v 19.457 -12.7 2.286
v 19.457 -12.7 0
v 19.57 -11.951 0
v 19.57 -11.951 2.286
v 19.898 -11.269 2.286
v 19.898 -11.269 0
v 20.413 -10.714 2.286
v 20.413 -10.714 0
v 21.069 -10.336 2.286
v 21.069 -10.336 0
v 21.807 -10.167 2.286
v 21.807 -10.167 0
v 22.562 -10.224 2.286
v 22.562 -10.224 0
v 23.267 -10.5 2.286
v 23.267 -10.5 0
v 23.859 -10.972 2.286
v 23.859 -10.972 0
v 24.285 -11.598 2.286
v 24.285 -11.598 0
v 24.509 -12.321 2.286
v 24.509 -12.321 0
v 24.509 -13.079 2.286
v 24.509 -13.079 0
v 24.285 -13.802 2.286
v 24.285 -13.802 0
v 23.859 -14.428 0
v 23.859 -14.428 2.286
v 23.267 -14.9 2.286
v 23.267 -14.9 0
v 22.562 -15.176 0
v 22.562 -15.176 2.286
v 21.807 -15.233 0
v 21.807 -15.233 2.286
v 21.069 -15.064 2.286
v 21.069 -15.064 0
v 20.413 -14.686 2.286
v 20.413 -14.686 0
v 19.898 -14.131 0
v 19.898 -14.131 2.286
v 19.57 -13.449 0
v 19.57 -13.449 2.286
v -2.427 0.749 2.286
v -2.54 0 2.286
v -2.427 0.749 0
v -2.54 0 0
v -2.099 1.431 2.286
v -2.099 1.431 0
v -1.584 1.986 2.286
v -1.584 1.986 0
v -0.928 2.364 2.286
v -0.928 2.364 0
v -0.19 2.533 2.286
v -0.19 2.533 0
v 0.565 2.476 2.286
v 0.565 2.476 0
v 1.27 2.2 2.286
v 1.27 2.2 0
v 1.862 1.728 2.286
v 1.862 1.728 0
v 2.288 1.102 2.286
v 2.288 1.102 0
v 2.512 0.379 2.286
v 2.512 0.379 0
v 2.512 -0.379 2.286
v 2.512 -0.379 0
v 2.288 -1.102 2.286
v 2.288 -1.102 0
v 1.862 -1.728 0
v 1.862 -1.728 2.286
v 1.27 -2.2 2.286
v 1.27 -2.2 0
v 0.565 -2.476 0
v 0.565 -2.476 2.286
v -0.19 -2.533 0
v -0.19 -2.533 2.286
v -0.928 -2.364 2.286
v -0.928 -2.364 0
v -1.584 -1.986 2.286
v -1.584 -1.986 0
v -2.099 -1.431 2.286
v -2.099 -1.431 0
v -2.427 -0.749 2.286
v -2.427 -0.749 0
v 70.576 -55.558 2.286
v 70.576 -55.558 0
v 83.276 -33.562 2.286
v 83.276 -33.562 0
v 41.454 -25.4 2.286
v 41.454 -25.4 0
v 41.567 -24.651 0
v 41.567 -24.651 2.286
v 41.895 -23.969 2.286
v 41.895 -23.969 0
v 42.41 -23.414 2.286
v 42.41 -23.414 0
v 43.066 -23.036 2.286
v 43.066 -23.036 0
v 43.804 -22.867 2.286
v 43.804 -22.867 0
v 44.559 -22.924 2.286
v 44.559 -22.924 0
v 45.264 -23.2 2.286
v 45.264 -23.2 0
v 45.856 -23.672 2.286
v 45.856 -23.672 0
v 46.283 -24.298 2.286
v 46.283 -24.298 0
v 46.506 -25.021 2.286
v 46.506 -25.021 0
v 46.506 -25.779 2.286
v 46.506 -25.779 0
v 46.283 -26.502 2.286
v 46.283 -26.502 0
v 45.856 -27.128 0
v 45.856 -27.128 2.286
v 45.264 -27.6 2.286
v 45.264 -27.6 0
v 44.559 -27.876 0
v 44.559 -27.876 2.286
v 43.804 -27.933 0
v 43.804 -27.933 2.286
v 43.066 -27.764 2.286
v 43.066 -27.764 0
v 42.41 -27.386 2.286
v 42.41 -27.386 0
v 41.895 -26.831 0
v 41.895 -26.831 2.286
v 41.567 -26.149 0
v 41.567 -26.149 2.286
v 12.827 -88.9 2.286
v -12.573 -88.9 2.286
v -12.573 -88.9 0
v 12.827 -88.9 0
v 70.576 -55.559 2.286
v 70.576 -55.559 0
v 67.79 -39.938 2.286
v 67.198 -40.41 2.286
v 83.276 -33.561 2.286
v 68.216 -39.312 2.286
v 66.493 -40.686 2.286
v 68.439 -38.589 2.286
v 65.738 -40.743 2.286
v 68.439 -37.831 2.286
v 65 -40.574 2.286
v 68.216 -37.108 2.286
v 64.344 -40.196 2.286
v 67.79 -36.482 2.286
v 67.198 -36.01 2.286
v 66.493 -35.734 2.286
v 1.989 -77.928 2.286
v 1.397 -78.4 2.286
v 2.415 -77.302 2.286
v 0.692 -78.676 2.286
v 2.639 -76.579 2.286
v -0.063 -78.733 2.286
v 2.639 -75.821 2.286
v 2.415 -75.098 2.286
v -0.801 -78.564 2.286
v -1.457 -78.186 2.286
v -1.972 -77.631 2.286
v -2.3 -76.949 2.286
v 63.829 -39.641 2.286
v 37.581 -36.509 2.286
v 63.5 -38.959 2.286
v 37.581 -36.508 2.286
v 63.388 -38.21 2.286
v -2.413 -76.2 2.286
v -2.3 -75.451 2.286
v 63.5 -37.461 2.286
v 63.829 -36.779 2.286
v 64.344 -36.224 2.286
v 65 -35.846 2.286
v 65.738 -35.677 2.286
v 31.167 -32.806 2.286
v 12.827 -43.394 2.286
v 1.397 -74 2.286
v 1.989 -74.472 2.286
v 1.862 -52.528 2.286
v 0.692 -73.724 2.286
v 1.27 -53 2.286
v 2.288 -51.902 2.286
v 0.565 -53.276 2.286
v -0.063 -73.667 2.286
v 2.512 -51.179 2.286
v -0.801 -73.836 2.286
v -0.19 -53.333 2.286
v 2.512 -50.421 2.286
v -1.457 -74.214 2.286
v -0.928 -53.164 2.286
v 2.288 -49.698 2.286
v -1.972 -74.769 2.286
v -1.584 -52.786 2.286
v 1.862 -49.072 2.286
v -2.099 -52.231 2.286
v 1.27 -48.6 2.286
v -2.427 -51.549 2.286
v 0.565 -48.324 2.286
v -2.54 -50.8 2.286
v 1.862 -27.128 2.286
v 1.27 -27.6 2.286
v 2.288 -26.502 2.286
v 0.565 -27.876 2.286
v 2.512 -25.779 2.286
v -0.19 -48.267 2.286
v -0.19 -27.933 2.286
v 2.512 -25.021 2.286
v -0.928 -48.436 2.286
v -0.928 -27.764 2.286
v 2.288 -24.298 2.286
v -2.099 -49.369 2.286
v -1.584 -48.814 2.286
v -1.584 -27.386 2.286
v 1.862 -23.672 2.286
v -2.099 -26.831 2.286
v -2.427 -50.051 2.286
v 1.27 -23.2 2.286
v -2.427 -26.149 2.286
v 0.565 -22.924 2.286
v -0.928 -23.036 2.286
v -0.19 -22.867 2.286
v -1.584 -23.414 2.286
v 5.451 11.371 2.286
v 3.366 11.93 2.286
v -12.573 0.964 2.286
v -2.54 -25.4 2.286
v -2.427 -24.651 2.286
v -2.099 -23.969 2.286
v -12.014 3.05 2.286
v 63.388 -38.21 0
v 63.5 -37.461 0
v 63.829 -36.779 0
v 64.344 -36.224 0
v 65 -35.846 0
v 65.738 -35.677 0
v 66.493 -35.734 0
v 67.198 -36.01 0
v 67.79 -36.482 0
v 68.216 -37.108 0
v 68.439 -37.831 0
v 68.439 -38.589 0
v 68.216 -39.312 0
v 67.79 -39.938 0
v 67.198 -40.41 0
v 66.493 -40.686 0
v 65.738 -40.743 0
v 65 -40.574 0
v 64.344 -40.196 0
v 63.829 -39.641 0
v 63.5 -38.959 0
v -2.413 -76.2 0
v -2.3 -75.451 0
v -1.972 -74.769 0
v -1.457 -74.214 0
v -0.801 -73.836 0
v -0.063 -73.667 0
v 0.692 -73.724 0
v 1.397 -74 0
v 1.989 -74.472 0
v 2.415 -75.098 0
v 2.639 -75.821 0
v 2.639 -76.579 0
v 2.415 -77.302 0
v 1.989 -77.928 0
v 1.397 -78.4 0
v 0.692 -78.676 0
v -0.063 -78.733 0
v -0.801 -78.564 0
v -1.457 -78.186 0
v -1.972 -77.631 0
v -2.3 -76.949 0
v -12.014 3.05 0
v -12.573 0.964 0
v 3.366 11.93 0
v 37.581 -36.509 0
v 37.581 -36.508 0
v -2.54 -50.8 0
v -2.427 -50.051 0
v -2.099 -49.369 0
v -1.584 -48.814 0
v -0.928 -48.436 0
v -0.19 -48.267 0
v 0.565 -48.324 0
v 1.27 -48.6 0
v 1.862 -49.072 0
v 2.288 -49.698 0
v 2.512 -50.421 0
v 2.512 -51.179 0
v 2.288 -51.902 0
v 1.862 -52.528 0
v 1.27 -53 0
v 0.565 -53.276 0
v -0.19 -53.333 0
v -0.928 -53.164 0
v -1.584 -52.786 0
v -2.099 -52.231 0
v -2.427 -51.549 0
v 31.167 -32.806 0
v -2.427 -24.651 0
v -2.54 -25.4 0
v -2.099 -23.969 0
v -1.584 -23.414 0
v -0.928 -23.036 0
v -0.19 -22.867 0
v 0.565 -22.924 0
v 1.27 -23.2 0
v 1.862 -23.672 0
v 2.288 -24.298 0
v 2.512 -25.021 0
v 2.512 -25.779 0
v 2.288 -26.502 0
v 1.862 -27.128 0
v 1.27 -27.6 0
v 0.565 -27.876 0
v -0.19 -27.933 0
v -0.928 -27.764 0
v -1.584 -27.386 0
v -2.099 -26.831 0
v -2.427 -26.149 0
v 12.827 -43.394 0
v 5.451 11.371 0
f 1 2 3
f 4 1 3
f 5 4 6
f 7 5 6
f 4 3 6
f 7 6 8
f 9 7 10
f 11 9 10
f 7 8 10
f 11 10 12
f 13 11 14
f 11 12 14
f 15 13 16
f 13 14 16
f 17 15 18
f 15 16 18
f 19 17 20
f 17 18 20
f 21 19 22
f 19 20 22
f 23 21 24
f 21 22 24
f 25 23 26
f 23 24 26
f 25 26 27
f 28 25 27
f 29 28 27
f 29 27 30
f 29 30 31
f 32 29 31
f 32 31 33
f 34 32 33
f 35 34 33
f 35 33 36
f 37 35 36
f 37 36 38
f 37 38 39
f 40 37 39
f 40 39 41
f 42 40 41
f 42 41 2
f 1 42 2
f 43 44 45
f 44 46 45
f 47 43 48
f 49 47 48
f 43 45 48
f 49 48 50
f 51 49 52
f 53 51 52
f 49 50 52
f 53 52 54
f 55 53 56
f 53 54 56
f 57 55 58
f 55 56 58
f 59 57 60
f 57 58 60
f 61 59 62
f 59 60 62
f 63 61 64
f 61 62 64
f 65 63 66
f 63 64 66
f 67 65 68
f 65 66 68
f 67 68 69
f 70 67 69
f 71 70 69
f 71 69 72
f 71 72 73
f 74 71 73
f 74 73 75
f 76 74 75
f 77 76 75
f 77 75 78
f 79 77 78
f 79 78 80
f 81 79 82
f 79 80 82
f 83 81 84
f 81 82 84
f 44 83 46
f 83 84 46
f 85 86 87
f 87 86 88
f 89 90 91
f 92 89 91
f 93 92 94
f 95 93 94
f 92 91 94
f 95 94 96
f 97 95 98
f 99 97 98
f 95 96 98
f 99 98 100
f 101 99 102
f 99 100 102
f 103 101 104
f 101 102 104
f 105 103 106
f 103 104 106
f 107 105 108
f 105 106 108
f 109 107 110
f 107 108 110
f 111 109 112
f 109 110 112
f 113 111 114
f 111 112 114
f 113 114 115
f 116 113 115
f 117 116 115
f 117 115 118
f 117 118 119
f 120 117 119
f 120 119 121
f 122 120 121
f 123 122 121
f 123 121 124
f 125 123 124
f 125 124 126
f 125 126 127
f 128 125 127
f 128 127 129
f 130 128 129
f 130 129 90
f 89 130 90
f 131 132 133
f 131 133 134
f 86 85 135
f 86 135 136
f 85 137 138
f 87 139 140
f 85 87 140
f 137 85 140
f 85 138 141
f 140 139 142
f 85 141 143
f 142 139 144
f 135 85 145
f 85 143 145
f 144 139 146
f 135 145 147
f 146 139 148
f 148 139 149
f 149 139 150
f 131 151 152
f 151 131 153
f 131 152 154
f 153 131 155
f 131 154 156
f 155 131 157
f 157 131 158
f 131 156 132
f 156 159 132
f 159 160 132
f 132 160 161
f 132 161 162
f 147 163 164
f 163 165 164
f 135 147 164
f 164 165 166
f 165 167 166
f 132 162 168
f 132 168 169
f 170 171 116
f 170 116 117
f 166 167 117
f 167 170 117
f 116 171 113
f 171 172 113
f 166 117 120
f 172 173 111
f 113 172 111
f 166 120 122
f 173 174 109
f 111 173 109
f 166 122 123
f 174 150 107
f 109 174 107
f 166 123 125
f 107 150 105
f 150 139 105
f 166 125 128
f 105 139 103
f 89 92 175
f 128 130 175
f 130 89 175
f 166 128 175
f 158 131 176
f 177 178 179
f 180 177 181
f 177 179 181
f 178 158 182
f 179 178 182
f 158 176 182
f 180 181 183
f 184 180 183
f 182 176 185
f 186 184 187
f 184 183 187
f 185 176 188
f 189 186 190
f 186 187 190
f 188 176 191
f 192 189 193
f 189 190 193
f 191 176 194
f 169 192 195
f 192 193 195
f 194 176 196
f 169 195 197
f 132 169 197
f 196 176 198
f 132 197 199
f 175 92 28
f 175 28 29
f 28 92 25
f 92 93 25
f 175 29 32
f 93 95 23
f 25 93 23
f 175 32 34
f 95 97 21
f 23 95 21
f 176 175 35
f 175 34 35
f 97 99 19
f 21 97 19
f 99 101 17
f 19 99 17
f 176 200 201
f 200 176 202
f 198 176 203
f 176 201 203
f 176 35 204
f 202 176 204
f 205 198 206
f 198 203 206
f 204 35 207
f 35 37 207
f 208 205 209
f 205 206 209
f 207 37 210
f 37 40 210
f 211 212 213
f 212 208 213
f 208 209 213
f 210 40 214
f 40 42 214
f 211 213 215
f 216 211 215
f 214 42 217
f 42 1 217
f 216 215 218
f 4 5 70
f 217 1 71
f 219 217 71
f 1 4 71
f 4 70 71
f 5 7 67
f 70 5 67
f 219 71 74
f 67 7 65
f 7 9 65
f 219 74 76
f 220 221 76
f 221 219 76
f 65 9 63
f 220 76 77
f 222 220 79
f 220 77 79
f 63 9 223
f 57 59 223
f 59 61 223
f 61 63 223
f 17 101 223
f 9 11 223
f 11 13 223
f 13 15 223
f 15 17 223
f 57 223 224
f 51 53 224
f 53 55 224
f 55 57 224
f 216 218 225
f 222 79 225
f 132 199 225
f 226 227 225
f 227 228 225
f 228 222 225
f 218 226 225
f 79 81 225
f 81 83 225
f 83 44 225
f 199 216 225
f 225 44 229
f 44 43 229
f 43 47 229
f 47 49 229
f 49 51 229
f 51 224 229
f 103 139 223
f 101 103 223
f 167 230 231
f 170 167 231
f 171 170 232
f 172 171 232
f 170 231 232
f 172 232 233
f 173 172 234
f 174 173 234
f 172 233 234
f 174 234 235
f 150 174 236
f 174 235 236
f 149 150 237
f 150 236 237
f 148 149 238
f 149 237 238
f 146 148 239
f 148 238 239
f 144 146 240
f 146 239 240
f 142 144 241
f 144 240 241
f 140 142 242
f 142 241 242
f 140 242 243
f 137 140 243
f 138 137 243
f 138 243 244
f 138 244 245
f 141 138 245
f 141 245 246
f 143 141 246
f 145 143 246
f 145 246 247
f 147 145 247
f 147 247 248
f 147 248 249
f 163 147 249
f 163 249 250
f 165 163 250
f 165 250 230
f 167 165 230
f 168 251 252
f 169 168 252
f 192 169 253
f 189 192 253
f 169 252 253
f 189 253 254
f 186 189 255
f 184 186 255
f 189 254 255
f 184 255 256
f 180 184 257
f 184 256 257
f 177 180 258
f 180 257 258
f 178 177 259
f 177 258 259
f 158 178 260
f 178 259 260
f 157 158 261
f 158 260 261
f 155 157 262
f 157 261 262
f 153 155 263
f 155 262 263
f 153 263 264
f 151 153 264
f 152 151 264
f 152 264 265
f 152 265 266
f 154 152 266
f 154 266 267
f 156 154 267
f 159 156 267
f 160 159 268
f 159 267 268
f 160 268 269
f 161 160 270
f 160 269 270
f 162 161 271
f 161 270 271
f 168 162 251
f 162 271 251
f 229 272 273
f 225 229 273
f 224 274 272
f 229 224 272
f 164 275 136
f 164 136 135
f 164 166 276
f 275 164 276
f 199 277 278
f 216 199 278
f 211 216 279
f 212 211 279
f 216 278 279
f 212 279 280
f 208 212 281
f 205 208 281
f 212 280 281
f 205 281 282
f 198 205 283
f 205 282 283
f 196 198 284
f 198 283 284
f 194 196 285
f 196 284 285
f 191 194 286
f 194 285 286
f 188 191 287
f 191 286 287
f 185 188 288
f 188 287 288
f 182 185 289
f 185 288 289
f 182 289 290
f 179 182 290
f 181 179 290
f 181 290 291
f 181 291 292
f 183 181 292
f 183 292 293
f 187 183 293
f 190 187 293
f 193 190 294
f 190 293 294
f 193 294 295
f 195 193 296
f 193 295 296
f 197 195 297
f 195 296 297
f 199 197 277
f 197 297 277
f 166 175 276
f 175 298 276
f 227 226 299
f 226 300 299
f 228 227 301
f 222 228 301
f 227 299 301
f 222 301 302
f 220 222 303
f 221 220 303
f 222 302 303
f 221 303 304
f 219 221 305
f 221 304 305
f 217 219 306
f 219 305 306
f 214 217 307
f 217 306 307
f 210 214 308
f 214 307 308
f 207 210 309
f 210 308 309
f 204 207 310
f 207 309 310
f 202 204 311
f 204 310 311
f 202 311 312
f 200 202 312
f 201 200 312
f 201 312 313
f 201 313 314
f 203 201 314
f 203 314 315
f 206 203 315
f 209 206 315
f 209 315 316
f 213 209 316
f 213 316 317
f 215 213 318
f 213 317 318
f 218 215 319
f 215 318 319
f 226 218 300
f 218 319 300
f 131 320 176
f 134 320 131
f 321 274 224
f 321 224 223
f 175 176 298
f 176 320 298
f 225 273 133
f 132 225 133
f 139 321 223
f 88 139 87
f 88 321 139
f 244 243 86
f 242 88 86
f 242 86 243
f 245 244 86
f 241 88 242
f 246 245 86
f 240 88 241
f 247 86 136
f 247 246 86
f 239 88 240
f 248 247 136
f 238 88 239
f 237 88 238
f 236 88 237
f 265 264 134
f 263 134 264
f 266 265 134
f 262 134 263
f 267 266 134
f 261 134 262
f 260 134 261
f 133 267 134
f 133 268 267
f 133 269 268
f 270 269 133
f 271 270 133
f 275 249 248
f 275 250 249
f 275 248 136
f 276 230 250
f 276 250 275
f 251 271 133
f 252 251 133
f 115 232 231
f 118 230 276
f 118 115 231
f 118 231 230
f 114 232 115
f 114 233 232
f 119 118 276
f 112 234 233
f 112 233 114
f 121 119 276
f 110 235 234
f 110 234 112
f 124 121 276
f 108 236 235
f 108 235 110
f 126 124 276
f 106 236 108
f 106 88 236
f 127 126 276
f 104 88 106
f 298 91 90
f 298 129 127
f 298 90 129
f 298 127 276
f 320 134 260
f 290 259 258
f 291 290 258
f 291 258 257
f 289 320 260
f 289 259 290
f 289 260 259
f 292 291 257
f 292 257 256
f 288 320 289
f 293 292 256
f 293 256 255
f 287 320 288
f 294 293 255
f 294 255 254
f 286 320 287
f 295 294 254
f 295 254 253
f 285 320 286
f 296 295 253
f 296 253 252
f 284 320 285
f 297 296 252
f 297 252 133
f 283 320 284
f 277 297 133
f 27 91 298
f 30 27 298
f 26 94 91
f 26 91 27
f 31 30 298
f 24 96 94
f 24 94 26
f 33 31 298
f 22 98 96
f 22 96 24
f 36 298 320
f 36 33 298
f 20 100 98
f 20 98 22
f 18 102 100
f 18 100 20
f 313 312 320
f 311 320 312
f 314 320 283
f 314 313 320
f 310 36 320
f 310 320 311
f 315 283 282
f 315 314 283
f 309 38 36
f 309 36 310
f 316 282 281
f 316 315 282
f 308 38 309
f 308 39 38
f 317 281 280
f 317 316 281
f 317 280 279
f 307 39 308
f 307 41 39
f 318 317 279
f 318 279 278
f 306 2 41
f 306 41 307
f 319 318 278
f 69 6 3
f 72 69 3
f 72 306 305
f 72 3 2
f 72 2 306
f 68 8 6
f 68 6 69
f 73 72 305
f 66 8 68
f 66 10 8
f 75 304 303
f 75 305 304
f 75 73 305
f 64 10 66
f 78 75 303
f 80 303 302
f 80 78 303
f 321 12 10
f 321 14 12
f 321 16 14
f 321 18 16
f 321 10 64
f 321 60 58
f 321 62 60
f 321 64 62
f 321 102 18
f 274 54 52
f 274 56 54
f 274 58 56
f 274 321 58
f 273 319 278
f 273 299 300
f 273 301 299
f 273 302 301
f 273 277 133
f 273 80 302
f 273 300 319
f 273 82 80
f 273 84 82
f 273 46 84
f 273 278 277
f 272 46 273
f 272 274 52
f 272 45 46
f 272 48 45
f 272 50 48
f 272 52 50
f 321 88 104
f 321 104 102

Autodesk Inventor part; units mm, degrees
ref_plane "YZ Plane" through (0, 0, 0) normal (1, 0, 0) x (0, 1, 0)
ref_plane "XZ Plane" through (0, 0, 0) normal (0, 1, 0) x (-1, 0, 0)
ref_plane "XY Plane" through (0, 0, 0) normal (0, 0, 1) x (1, 0, 0)
sketch "Sketch3" plane through (-10.4876, -69.85, 2.286) normal (0, -1, 0) x (1, 0, 0)
  line L0 (0, 0) -> (22.7558, 0) projected
  line L1 (0, -2.286) -> (0, 0) projected
  line L2 (0, -2.286) -> (22.7558, -2.286) projected
  line L3 (22.7558, -2.286) -> (22.7558, 0) projected
  line L4 (22.7558, 0) -> (23.3146, 0) projected
  line L5 (22.7558, -2.286) -> (22.7558, 0) projected
  line L6 (22.7558, -2.286) -> (23.3146, -2.286) projected
  line L7 (23.3146, -2.286) -> (23.3146, 0) projected
  line L8 (0, 0) -> (-2.0854, 0) projected
  line L9 (-2.0854, -2.286) -> (-2.0854, 0) projected
  line L10 (0, -2.286) -> (-2.0854, -2.286) projected
  line L11 (0, -2.286) -> (0, 0) projected
  point P0 (10.4876, -2.286)
extrude "Extrusion3" add sketch "Sketch3" along normal mid plane 38.1
sketch "Sketch4" plane through (65.7357, -25.8425, 2.286) normal (0.866, -0.5, 0) x (0, 0, -1)
  line L0 (2.286, 0) -> (0, 0) projected
  line L1 (0, -22.7558) -> (0, 0) projected
  line L2 (2.286, -22.7558) -> (0, -22.7558) projected
  line L3 (2.286, -22.7558) -> (2.286, 0) projected
  line L4 (0, 0) -> (0, 2.0854) projected
  line L5 (2.286, 0) -> (0, 0) projected
  line L6 (2.286, 0) -> (2.286, 2.0854) projected
  line L7 (2.286, 2.0854) -> (0, 2.0854) projected
  line L8 (0, -23.3146) -> (0, -22.7558) projected
  line L9 (2.286, -23.3146) -> (0, -23.3146) projected
  line L10 (2.286, -23.3146) -> (2.286, -22.7558) projected
  line L11 (2.286, -22.7558) -> (0, -22.7558) projected
  point P0 (2.286, -10.4876)
extrude "Extrusion4" add sketch "Sketch4" along normal mid plane 38.1
sketch "Sketch5" plane through (12.827, -88.9, 0) normal (0, 0, -1) x (-1, 0, 0)
  arc A0 (-30.132, 61.7072) -> (-32.2021, 65.2928) centre (-31.1671, 63.5) ccw projected
  line L0 (-32.2021, 65.2928) -> (-30.132, 61.7072) projected
  line L1 (7.3756, 100.2707) -> (-70.4492, 55.3385) projected
  line L2 (-57.7492, 33.3415) -> (-70.4492, 55.3385) projected
  line L3 (-4.7625, 63.9334) -> (-57.7492, 33.3415) projected
  arc A1 (0, 61.1837) -> (-4.7625, 63.9334) centre (-3.175, 61.1837) ccw projected
  line L4 (0, 61.1837) -> (0, 0) projected
  line L5 (25.4, 0) -> (0, 0) projected
  line L6 (25.4, 89.8643) -> (25.4, 0) projected
  line L7 (24.8412, 91.9497) -> (25.4, 89.8643) projected
  line L8 (9.461, 100.8295) -> (24.8412, 91.9497) projected
  line L9 (9.461, 100.8295) -> (7.3756, 100.2707) projected
  arc A2 (14.8971, 38.1) -> (10.7569, 38.1) centre (12.827, 38.1) ccw projected
  line L10 (10.7569, 38.1) -> (14.8971, 38.1) projected
  circle A3 centre (-9.17, 76.2) radius 2.0701 projected
  circle A4 centre (12.827, 88.9) radius 2.0701 projected
  circle A5 centre (12.827, 63.5) radius 2.0701 projected
extrude "Extrusion5" add sketch "Sketch5" against normal blind 2.286
sketch "Sketch6" plane through (12.827, -88.9, 0) normal (0, 0, -1) x (-1, 0, 0)
  arc A0 (-30.132, 61.7072) -> (-32.2021, 65.2928) centre (-31.1671, 63.5) ccw projected
  line L0 (-57.7492, 33.3415) -> (-70.4492, 55.3385) projected
  line L1 (-4.7625, 63.9334) -> (-57.7492, 33.3415) projected
  line L2 (25.4, 89.8643) -> (25.4, 0) projected
  arc A1 (14.8971, 38.1) -> (10.7569, 38.1) centre (12.827, 38.1) ccw projected
  circle A2 centre (-9.17, 76.2) radius 2.0701 projected
  circle A3 centre (12.827, 88.9) radius 2.0701 projected
  circle A4 centre (12.827, 63.5) radius 2.0701 projected
  circle A5 centre (12.827, 88.9) radius 2.54
  circle A6 centre (-9.17, 76.2) radius 2.54
  circle A7 centre (12.827, 63.5) radius 2.54
  circle A8 centre (12.827, 38.1) radius 2.54
  circle A9 centre (-31.1671, 63.5) radius 2.54
  circle A10 centre (-53.1006, 50.69) radius 2.54
  circle A11 centre (12.7, 12.7) radius 2.54
  dimension "d20" = 5.08
  dimension "d21" = 5.08
  dimension "d22" = 5.08
  dimension "d23" = 5.08
  dimension "d24" = 5.08
  dimension "d25" = 5.08
  dimension "d26" = 5.08
  dimension "d27" = 12.7
  dimension "d28" = 25.4
  dimension "d29" = 12.7
  dimension "d30" = 12.7
extrude "Extrusion6" cut sketch "Sketch6" against normal blind 2.286 contours A2 | A3 | A4 | A5 | A6 | A7 | A8 | A9 | A10 | A11
sketch "Sketch7" plane through (12.827, -88.9, 0) normal (0, 0, -1) x (-1, 0, 0)
  circle A0 centre (12.827, 38.1) radius 2.54 projected
  circle A1 centre (-31.1671, 63.5) radius 2.54 projected
  line L0 (-4.7625, 63.9334) -> (-57.7492, 33.3415) projected
  arc A2 (0, 61.1837) -> (-4.7625, 63.9334) centre (-3.175, 61.1837) ccw projected
  line L1 (0, 61.1837) -> (0, 0) projected
  line L2 (-31.1671, 63.5) -> (12.827, 38.1) construction
  line L3 (-18.3401, 56.0943) -> (0, 66.683)
  line L4 (0, 66.683) -> (0, 45.5057)
  line L5 (0, 61.1837) -> (0, 0) projected
  line L6 (0, 45.5057) -> (-18.3401, 56.0943)
extrude "Extrusion7" add sketch "Sketch7" against normal blind 2.286 contours A2 L1 L6 L0
properties part number "Versaframe 60deg gusset" material "Aluminum 6061"
